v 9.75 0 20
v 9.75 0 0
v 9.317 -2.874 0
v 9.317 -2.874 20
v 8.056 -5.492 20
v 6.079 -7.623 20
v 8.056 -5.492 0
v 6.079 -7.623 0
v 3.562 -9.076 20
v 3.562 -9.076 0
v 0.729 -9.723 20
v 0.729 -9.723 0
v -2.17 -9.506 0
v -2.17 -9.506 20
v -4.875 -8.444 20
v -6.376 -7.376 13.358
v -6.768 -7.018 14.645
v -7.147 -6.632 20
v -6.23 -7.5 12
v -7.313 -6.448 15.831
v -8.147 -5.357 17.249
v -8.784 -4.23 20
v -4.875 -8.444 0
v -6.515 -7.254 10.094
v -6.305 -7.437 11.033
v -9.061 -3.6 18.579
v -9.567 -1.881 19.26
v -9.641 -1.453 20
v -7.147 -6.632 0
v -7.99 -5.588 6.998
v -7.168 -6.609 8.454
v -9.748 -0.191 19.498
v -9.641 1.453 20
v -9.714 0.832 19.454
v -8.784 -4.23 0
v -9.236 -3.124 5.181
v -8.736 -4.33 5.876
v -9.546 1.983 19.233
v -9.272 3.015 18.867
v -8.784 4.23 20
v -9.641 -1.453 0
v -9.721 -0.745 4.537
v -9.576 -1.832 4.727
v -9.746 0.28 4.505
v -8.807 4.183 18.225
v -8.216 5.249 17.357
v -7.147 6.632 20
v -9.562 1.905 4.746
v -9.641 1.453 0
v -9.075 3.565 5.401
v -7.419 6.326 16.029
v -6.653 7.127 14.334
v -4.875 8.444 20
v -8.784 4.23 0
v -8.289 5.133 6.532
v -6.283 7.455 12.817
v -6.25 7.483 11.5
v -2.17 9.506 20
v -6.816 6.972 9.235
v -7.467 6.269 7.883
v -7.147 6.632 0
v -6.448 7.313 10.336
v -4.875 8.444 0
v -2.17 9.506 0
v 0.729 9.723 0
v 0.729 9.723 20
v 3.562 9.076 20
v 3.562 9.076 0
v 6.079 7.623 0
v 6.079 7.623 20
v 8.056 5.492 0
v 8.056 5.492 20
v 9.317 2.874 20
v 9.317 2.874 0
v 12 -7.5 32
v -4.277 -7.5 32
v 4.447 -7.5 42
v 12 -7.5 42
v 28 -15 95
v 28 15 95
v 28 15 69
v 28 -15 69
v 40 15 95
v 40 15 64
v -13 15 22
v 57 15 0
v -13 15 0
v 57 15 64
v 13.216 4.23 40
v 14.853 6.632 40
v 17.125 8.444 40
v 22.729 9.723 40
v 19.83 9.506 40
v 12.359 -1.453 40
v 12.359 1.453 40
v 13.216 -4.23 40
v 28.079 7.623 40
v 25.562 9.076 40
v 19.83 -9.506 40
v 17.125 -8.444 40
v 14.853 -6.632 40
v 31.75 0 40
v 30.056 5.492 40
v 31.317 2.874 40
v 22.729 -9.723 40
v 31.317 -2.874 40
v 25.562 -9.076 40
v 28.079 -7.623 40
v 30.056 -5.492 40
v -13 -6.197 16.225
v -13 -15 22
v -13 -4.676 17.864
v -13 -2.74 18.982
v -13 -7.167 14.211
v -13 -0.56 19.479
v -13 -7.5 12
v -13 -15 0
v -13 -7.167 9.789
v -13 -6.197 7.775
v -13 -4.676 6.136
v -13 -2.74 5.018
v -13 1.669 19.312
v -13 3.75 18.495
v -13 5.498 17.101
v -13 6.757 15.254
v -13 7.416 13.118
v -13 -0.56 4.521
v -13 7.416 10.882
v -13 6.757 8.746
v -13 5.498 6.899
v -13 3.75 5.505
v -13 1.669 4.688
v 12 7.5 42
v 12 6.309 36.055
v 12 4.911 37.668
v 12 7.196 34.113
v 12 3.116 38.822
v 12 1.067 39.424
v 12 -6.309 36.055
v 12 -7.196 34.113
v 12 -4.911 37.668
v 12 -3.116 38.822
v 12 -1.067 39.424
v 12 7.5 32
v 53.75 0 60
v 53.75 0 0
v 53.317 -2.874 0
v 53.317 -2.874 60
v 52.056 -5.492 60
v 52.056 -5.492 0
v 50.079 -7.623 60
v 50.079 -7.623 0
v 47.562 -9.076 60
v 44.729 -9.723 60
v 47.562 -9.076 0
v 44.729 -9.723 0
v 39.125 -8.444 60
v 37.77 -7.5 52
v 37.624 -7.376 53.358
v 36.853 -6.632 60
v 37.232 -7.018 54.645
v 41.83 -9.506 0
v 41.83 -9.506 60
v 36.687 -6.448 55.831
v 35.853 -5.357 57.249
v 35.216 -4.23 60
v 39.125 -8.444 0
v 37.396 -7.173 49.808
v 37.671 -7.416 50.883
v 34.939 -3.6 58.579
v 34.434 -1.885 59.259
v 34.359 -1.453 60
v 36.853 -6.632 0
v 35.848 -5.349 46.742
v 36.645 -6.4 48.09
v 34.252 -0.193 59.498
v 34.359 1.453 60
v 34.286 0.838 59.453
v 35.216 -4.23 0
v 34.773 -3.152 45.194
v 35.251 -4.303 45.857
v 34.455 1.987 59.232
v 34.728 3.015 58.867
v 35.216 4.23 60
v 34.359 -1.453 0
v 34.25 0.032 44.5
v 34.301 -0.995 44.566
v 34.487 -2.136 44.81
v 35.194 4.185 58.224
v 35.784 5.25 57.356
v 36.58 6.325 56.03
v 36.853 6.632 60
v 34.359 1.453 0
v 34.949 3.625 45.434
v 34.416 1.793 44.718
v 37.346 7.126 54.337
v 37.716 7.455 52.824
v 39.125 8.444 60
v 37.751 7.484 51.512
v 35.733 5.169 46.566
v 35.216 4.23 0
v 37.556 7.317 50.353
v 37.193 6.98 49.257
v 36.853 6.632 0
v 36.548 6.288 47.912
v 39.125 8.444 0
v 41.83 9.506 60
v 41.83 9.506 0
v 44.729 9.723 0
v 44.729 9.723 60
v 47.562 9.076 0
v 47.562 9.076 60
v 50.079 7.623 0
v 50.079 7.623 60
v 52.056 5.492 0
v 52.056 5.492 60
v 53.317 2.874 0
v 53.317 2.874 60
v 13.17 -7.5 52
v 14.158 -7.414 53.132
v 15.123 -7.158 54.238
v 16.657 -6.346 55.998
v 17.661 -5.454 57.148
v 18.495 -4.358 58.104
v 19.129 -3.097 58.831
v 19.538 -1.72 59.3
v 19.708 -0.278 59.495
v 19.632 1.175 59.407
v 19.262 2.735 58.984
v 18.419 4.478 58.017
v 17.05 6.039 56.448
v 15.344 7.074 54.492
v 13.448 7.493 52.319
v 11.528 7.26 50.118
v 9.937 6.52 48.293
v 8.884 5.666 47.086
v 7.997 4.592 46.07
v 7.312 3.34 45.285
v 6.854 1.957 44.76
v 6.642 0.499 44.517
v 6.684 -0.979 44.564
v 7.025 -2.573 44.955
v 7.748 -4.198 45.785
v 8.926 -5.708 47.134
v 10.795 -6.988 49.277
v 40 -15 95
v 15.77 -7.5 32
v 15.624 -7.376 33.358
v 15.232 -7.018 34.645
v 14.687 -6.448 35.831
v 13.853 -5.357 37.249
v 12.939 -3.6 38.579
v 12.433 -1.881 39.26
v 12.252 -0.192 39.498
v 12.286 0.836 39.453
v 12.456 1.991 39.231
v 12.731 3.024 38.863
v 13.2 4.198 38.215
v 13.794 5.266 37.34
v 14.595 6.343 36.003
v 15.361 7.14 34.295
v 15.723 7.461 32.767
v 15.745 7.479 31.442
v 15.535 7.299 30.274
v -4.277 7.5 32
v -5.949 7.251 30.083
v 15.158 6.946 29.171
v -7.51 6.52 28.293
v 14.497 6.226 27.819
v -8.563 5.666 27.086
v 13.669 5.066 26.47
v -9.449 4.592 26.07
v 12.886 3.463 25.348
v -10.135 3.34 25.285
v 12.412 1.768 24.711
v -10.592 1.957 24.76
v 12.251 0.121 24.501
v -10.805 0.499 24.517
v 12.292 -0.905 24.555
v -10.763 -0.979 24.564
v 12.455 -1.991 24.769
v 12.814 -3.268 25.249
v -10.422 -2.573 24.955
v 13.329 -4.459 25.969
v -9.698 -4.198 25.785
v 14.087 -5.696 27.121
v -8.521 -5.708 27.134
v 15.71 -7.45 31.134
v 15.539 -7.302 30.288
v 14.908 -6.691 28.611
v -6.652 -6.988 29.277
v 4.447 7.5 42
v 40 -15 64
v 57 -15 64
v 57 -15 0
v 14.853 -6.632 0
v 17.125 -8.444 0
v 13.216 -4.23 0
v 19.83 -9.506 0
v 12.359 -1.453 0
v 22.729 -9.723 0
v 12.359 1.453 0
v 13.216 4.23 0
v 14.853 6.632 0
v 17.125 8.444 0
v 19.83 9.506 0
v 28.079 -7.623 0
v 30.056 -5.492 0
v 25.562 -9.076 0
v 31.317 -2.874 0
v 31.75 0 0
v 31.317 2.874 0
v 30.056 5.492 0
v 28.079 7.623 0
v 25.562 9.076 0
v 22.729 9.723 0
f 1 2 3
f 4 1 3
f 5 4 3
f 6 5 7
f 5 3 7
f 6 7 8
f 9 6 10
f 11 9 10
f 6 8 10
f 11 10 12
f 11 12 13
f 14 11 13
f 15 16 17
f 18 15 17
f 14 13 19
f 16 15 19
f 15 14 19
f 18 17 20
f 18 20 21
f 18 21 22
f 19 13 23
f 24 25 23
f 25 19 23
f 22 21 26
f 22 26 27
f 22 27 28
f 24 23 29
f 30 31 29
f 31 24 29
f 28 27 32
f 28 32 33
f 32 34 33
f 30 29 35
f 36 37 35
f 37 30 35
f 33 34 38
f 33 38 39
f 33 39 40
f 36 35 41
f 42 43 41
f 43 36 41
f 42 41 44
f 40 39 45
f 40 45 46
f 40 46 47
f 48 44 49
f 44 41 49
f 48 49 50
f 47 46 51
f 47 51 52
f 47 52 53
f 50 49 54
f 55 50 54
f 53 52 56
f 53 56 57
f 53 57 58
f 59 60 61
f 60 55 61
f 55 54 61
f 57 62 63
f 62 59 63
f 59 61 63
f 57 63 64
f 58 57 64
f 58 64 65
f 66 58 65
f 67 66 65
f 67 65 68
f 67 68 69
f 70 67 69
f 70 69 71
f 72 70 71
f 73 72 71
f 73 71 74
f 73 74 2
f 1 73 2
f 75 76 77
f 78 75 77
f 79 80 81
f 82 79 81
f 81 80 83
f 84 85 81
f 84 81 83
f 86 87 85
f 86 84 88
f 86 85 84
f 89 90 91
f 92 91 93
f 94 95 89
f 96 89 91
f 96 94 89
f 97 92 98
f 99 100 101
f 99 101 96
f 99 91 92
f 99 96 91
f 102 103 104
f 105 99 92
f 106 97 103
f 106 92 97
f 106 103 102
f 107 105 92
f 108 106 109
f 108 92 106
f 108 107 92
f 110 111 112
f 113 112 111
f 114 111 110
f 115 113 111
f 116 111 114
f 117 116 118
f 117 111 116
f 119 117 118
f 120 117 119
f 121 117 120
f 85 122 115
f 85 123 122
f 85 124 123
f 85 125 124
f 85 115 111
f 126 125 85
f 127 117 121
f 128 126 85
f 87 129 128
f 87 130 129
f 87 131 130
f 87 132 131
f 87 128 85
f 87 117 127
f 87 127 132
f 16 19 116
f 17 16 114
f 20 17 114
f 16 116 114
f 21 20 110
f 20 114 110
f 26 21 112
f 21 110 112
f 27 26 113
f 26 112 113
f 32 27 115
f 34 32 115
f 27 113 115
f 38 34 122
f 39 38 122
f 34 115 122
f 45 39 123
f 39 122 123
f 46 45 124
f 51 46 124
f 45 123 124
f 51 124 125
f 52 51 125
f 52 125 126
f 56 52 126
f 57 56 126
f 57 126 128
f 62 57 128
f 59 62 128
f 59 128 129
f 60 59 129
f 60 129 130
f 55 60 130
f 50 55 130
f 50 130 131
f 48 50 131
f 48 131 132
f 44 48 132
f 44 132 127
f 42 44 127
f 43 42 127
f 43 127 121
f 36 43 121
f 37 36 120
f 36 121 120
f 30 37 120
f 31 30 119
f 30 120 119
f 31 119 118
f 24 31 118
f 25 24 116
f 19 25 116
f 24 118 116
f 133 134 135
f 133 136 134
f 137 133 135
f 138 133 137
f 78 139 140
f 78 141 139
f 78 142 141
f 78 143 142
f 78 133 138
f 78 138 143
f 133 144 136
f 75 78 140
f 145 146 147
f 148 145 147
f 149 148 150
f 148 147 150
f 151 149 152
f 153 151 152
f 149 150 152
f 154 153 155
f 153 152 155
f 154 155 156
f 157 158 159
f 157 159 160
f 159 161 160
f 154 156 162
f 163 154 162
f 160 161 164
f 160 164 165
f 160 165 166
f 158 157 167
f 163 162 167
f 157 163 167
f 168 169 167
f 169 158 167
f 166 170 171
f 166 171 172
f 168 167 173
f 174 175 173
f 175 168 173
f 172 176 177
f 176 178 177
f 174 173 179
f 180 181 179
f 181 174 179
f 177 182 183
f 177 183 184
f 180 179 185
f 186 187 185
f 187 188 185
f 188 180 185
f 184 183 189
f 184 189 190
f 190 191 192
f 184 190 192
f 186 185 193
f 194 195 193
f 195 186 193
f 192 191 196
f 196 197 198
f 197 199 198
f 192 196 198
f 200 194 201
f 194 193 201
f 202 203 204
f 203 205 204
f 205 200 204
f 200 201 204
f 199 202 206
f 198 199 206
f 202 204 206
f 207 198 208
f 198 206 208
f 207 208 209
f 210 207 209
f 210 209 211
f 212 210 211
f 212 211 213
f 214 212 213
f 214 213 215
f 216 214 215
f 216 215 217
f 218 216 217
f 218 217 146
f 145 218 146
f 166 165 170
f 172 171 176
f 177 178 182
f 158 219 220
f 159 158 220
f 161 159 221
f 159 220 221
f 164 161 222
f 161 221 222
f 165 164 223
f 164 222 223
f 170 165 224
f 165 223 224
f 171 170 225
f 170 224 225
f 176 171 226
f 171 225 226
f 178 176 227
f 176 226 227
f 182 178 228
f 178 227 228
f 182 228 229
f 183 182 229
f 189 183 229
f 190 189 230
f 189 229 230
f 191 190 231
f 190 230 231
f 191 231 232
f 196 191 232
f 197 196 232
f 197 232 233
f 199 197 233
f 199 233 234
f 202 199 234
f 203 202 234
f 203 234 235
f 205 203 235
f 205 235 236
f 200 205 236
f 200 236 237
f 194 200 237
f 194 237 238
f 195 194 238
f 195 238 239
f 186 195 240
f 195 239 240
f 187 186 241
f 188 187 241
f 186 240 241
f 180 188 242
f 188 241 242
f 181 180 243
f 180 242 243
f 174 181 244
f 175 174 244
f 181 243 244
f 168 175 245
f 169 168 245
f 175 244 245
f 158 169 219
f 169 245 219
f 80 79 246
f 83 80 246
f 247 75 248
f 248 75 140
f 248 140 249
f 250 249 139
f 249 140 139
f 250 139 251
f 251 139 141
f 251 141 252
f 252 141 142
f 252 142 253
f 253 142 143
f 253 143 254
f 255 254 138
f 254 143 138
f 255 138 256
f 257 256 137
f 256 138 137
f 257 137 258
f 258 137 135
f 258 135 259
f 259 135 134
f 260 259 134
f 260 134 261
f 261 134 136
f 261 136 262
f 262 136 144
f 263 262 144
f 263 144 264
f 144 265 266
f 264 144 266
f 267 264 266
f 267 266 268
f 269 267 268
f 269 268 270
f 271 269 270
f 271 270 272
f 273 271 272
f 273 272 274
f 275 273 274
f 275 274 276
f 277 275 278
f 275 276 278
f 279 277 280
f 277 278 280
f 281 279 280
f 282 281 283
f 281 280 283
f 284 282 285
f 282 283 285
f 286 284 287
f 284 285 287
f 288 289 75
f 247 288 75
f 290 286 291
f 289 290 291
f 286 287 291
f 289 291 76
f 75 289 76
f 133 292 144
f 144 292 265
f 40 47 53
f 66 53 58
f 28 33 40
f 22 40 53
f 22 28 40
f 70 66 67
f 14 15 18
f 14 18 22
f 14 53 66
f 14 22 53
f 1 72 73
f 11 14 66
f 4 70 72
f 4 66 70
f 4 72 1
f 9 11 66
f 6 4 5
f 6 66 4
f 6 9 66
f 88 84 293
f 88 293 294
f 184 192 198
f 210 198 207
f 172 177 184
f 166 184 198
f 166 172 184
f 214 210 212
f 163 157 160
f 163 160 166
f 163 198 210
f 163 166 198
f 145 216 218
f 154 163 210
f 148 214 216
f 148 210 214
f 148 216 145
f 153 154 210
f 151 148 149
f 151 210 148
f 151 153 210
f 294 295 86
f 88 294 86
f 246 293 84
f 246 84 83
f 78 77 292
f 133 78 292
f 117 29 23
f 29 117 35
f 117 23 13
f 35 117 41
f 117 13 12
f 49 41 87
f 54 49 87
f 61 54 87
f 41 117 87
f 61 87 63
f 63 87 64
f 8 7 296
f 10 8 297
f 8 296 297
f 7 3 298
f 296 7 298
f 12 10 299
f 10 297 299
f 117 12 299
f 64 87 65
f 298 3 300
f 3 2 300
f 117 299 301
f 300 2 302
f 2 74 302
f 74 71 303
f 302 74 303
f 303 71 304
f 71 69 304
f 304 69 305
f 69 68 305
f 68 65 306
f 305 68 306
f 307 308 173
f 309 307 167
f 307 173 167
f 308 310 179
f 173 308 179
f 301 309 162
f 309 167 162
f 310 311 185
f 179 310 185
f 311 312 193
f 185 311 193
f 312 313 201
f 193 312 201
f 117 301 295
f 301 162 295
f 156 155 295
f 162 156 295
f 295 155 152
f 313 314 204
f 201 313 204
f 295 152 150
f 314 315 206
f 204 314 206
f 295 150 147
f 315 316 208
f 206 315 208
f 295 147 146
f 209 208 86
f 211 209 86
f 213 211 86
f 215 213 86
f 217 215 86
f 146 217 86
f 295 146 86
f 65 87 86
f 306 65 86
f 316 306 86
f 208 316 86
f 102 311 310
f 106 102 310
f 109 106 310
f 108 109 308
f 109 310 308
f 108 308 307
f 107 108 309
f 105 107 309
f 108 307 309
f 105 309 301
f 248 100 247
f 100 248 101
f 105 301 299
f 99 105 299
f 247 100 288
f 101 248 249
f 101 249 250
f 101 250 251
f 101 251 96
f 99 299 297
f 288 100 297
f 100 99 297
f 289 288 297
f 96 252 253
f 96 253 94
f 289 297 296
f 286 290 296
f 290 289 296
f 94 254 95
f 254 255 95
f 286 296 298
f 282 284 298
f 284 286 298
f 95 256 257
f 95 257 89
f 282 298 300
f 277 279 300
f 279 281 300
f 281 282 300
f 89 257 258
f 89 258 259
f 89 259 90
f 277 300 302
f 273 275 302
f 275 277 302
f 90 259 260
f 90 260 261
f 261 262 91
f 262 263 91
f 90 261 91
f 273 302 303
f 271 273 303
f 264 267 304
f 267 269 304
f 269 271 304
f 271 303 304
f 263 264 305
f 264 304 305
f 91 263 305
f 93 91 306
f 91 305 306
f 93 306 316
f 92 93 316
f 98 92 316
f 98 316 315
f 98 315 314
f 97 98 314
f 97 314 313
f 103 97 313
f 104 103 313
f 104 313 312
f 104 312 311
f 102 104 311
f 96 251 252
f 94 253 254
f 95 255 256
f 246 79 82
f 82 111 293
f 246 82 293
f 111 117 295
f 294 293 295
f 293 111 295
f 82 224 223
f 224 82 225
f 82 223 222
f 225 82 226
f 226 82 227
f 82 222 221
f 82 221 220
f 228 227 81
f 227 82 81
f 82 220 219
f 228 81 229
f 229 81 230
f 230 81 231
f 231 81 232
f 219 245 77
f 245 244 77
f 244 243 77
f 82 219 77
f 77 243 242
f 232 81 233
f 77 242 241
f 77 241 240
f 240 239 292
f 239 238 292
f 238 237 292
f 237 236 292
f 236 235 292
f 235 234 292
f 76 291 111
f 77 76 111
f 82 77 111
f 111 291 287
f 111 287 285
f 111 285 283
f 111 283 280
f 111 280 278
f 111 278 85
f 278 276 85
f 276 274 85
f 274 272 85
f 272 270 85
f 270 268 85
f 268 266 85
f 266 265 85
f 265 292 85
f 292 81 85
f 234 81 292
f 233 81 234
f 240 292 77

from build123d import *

# Parameters (mm, degrees)
F0_W      = 70
F0_H      = 30
F1_DEPTH  = 95
F2_W      = 17
F2_H      = 31
F3_DEPTH  = 41.4
F4_R      = 9.75
F5_DEPTH  = 60
F8_DEPTH  = 43.7
F6_R      = 7.5
F9_DEPTH  = 57
F10_R     = 9.75
F11_DEPTH = 40
F12_R     = 9.75
F13_DEPTH = 20
F14_R     = 7.5
F15_DEPTH = 32.1
F16_R     = 7.5
F17_DEPTH = 11.1
F19_DEPTH = 25


# Not quite as in the source:
# - a feature names something its author has since deleted; it is built from what else it names


with BuildPart() as f1:
    # F0 (on Top) → F1 (new body)
    with BuildSketch(Plane.XY):
        with Locations((22, 0)):
            Rectangle(F0_W, F0_H)
    extrude(amount=F1_DEPTH)

    # F2 (on face) → F3 (cut)
    with BuildSketch(Plane.XZ.offset(15)):
        with Locations((48.5, 79.5)):
            Rectangle(F2_W, F2_H)
    extrude(amount=-F3_DEPTH, mode=Mode.SUBTRACT)

    # F4 (on face) → F5 (cut)
    with BuildSketch(Plane(origin=(0, 0, 0), x_dir=(1, 0, 0), z_dir=(0, 0, -1))):
        with Locations((44, 0)):
            Circle(F4_R)
    extrude(amount=-F5_DEPTH, mode=Mode.SUBTRACT)

    # F7 (on face) → F8 (cut)
    with BuildSketch(Plane(origin=(0, 15, 0), x_dir=(-1, 0, 0), z_dir=(0, 1, 0))):
        Polygon((13, 95), (-28, 95), (-28, 69), (13, 22), align=None)
    extrude(amount=-F8_DEPTH, mode=Mode.SUBTRACT)

    # F6 (on face) → F9 (cut)
    with BuildSketch(Plane(origin=(-13, 0, 0), x_dir=(0, -1, 0), z_dir=(-1, 0, 0))):
        with Locations((0, 52)):
            Circle(F6_R)
    extrude(amount=-F9_DEPTH, mode=Mode.SUBTRACT)

    # F10 (on face) → F11 (cut)
    with BuildSketch(Plane(origin=(0, 0, 0), x_dir=(1, 0, 0), z_dir=(0, 0, -1))):
        with Locations((22, 0)):
            Circle(F10_R)
    extrude(amount=-F11_DEPTH, mode=Mode.SUBTRACT)

    # F12 (on face) → F13 (cut)
    with BuildSketch(Plane(origin=(0, 0, 0), x_dir=(1, 0, 0), z_dir=(0, 0, -1))):
        Circle(F12_R)
    extrude(amount=-F13_DEPTH, mode=Mode.SUBTRACT)

    # F14 (on face) → F15 (cut)
    with BuildSketch(Plane(origin=(-13, 0, 0), x_dir=(0, -1, 0), z_dir=(-1, 0, 0))):
        with Locations((0, 32)):
            Circle(F14_R)
    extrude(amount=-F15_DEPTH, mode=Mode.SUBTRACT)

    # F16 (on face) → F17 (cut)
    with BuildSketch(Plane(origin=(-13, 0, 0), x_dir=(0, -1, 0), z_dir=(-1, 0, 0))):
        with Locations((0, 12)):
            Circle(F16_R)
    extrude(amount=-F17_DEPTH, mode=Mode.SUBTRACT)

    # F18 (on face) → F19 (cut)
    with BuildSketch(Plane(origin=(-13, 0, 0), x_dir=(0, -1, 0), z_dir=(-1, 0, 0))):
        with BuildLine():
            Line((-7.5, 42), (-7.5, 32))
            ThreePointArc((-7.5, 32), (0, 24.5), (7.5, 32))
            Line((7.5, 32), (7.5, 42))
            Line((7.5, 42), (-7.5, 42))
        make_face()
    extrude(amount=-F19_DEPTH, mode=Mode.SUBTRACT)


solid = f1.part
